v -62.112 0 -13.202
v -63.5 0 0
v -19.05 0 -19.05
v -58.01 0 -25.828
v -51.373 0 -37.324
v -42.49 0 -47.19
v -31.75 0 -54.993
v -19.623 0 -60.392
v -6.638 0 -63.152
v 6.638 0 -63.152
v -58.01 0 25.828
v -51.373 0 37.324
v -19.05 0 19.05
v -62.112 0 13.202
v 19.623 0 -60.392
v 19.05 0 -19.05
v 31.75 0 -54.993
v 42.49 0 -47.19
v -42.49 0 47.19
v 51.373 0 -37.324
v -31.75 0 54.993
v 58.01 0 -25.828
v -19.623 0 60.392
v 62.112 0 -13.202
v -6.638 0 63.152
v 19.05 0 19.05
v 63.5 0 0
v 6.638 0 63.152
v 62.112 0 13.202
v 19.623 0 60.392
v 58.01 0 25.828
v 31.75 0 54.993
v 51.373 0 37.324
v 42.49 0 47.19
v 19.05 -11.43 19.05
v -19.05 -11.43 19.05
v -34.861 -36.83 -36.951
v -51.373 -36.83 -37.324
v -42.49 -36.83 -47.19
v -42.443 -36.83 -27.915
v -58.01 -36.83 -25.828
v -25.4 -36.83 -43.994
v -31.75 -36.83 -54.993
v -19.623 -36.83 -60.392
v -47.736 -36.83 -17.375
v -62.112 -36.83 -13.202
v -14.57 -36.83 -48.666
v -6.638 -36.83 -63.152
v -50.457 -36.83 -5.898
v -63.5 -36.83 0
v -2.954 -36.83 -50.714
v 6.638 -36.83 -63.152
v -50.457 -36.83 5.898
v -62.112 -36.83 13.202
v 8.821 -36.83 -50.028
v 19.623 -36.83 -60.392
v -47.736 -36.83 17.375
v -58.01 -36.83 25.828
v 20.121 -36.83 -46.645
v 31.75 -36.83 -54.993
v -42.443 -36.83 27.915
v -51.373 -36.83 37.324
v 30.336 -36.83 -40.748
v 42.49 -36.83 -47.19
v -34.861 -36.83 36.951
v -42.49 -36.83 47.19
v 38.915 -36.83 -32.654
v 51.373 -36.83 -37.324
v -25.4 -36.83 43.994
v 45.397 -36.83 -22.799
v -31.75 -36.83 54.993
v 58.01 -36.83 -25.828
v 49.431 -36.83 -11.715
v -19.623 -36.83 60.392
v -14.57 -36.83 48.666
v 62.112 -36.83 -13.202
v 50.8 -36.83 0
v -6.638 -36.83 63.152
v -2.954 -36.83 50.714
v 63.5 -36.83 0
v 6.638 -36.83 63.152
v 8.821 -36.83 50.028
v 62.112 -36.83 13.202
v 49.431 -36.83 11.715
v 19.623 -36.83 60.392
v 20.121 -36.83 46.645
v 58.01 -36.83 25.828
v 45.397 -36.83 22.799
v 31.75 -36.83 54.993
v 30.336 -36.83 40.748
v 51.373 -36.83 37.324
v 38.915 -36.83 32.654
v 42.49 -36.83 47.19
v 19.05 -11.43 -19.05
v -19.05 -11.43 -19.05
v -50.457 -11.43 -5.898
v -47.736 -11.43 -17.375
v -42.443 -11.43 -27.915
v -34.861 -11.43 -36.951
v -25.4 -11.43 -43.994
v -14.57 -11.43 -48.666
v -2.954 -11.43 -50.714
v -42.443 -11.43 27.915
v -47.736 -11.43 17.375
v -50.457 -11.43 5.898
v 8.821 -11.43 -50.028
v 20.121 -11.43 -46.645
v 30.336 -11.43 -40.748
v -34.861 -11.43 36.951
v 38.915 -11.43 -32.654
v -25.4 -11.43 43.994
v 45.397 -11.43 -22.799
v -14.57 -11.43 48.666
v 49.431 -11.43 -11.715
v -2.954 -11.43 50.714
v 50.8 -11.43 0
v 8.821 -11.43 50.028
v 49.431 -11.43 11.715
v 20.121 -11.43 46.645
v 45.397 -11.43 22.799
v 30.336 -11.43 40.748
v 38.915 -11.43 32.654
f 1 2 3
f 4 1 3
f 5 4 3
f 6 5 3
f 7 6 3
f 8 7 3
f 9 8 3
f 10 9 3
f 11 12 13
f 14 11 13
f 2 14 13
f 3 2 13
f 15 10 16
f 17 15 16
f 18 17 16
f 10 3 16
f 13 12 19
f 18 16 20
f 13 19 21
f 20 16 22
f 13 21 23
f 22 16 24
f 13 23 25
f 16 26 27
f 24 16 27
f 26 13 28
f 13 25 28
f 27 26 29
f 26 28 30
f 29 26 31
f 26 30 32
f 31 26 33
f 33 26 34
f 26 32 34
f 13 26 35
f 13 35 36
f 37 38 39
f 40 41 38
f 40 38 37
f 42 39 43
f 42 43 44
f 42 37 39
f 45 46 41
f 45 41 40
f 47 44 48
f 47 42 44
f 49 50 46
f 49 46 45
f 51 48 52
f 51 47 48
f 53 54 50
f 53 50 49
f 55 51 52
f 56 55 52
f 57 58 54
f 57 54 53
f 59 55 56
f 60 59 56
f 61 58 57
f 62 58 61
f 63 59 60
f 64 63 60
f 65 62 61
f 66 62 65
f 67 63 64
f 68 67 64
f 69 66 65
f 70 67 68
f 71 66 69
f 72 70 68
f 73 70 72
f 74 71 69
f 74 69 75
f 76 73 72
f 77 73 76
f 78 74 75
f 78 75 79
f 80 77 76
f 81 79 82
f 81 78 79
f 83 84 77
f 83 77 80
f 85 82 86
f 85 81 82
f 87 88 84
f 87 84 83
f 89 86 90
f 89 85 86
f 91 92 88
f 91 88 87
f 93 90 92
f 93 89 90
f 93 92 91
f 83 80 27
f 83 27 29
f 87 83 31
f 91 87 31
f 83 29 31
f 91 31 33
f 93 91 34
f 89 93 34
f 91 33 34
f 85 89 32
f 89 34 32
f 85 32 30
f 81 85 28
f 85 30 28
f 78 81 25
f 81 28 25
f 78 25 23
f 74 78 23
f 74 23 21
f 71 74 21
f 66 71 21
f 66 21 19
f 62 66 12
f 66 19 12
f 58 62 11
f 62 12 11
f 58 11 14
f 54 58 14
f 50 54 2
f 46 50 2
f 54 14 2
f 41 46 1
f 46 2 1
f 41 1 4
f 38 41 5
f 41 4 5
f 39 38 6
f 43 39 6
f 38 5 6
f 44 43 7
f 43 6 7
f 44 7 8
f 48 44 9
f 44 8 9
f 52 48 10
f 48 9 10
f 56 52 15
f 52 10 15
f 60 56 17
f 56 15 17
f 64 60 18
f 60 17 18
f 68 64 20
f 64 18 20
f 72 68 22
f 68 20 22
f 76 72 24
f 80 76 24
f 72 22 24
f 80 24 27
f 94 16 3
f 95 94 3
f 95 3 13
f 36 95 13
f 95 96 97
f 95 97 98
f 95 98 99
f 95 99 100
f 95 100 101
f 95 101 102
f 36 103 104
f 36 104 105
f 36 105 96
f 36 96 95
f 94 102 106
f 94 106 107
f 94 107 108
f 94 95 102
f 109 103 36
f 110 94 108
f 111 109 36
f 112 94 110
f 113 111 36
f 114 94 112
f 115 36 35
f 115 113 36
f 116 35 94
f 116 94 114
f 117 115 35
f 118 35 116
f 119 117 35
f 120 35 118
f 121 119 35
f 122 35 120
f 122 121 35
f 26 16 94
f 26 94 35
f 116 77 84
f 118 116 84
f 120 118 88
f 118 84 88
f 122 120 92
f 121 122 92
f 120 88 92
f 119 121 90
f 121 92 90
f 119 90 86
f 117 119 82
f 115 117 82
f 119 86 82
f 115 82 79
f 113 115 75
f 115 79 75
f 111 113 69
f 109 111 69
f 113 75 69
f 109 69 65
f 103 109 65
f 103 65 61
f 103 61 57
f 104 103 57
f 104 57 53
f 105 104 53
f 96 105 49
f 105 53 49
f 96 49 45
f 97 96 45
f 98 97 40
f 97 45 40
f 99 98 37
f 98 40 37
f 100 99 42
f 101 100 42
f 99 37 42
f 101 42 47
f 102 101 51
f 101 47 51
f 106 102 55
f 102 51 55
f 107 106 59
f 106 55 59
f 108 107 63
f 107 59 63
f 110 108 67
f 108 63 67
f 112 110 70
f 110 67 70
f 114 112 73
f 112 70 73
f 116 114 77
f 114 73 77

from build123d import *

# Parameters (mm, degrees)
F0_R     = 63.5
F1_DEPTH = 36.83
F2_R     = 50.8
F3_DEPTH = 25.4
F4_W     = 38.1
F4_H     = 38.1
F5_DEPTH = 25.4


with BuildPart() as f1:
    # F0 (on Front) → F1 (new body)
    with BuildSketch(Plane.XZ):
        Circle(F0_R)
    extrude(amount=F1_DEPTH)

    # F2 (on face) → F3 (cut)
    with BuildSketch(Plane.XZ.offset(36.83)):
        Circle(F2_R)
    extrude(amount=-F3_DEPTH, mode=Mode.SUBTRACT)

    # F4 (on face) → F5 (cut)
    with BuildSketch(Plane(origin=(0, 0, 0), x_dir=(-1, 0, 0), z_dir=(0, 1, 0))):
        Rectangle(F4_W, F4_H)
    extrude(amount=-F5_DEPTH, mode=Mode.SUBTRACT)


solid = f1.part
